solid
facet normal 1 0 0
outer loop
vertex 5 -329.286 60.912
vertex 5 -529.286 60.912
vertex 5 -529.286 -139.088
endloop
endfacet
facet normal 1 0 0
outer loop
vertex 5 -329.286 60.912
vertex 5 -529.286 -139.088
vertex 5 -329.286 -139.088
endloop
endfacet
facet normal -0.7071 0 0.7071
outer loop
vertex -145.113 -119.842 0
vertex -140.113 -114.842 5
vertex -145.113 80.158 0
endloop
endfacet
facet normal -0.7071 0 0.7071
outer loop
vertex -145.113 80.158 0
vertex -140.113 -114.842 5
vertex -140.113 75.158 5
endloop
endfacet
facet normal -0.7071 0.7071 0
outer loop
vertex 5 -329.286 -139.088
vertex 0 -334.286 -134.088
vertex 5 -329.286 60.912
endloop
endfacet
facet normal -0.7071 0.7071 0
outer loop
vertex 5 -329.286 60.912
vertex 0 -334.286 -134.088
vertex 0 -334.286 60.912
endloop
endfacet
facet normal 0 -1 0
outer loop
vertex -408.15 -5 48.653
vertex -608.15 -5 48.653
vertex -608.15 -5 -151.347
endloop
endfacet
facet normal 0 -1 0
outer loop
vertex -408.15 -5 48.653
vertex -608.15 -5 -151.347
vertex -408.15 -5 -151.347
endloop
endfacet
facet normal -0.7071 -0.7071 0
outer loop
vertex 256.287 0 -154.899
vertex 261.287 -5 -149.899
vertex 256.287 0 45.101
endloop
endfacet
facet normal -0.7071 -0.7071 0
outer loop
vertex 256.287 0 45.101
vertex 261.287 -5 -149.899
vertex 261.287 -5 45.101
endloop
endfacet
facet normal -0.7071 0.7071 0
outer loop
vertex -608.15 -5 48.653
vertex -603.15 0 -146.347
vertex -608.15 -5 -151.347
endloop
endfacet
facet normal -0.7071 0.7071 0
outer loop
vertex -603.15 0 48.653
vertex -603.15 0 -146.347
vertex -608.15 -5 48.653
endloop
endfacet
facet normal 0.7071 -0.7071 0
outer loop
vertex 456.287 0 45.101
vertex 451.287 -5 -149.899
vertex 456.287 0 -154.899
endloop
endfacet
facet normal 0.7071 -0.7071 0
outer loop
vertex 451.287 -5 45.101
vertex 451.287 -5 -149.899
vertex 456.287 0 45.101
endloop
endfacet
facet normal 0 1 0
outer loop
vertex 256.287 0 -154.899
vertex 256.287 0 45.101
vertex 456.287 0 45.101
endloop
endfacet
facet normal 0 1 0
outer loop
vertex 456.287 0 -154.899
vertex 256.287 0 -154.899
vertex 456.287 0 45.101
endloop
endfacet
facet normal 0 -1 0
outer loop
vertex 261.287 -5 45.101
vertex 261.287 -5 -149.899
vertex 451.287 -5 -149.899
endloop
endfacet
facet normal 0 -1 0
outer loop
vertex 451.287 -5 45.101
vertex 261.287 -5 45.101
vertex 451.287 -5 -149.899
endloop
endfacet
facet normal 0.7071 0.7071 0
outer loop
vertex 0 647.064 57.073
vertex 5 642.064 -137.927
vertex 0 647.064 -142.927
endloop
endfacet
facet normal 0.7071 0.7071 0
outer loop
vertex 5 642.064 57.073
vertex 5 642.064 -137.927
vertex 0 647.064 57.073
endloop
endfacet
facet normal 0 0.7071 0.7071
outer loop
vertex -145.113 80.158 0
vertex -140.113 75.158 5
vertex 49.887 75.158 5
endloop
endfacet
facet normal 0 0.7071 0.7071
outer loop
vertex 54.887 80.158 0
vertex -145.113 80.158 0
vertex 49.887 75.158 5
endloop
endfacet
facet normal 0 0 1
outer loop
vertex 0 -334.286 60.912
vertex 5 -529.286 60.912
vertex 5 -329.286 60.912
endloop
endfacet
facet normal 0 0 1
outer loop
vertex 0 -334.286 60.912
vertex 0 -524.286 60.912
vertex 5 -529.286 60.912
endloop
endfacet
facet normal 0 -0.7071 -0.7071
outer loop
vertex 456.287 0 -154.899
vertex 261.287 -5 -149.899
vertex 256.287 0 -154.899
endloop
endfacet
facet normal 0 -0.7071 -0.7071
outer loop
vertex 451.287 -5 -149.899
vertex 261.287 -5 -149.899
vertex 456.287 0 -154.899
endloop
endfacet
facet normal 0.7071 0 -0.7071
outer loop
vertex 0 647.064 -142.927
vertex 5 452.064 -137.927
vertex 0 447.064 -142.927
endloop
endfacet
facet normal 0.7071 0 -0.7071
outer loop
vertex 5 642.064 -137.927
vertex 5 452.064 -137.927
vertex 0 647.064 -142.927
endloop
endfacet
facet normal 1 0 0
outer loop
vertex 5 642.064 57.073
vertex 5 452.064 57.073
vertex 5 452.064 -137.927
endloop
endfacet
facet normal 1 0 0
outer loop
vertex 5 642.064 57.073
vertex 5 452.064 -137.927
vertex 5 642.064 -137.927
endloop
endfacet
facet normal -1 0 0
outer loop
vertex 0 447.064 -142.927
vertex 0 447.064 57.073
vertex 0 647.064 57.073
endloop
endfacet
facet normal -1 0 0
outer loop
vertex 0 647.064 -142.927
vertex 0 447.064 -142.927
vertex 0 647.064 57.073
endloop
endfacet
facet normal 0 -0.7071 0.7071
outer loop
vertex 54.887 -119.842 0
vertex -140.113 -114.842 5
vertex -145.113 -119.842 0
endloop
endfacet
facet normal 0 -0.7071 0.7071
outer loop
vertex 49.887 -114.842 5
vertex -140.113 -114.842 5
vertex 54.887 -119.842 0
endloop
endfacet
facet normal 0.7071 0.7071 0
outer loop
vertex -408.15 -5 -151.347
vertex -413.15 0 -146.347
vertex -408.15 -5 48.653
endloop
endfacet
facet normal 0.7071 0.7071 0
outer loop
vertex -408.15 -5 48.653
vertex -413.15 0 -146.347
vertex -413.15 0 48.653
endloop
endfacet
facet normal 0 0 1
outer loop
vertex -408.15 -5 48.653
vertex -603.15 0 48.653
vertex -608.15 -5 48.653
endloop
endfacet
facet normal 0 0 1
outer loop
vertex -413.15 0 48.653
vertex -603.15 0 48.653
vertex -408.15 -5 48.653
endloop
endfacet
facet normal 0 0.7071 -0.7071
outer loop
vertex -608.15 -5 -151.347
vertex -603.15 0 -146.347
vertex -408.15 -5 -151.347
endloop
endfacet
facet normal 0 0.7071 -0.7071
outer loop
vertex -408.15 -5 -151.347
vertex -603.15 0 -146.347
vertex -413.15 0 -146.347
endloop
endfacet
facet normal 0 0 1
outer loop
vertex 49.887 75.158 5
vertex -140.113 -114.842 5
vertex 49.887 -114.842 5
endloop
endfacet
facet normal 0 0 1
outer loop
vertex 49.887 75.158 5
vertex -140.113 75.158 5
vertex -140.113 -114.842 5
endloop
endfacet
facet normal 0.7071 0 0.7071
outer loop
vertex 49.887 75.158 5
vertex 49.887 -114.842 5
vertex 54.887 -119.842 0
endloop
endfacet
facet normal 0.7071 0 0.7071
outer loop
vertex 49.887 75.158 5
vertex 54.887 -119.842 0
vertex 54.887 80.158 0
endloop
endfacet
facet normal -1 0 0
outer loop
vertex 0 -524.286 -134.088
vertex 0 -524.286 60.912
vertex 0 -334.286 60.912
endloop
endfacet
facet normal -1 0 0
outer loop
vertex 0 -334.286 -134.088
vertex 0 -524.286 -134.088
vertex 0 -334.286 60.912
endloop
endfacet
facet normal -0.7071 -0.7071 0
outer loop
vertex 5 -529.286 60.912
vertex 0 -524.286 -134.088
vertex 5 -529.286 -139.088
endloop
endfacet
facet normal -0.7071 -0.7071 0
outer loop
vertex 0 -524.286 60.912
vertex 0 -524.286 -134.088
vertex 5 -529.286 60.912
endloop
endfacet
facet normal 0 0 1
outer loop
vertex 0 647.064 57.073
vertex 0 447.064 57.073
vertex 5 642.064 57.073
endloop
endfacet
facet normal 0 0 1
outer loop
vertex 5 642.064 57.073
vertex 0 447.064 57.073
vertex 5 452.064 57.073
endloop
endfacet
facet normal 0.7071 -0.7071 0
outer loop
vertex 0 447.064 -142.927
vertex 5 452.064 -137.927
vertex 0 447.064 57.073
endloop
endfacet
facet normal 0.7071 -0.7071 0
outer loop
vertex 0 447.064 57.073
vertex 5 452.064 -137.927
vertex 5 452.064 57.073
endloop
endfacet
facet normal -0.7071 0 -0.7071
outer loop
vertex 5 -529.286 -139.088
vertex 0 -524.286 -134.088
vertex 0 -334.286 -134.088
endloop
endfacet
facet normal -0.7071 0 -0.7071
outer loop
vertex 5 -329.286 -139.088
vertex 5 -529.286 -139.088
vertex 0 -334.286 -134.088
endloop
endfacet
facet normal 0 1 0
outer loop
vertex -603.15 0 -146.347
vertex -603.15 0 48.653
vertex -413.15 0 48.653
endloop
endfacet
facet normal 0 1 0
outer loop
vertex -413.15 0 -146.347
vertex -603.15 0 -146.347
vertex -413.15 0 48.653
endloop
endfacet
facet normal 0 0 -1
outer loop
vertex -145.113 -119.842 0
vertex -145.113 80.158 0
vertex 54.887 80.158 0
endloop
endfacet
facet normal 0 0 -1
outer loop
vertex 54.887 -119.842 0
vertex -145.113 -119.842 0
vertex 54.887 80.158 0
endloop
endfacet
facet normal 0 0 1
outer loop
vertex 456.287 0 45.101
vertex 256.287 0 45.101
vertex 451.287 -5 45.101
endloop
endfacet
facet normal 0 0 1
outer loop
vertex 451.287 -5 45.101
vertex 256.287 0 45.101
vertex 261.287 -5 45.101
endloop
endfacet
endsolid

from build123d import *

# Parameters (mm, degrees)
F0_W       = 200
F0_H       = 200
F1_DEPTH   = 5
F2_SIZE    = 4.99999
F3_W       = 200
F3_H       = 200
F4_DEPTH   = 5
F5_SIZE    = 4.99999
F6_W       = 200
F6_H       = 200
F7_DEPTH   = 5
F8_SIZE    = 4.99999
F9_W       = 200
F9_H       = 200
F10_DEPTH  = 5
F11_SIZE   = 4.99999
F11_2_SIZE = 4.99999


# Not quite as in the source:
# - a fillet or chamfer is up to 0.001 mm smaller than in the source, because OpenCascade refuses the exact size


with BuildPart() as f1:
    # F0 (on Top) → F1 (new body)
    with BuildSketch(Plane.XY):
        with Locations((-45.1127041131, -19.84155476)):
            Rectangle(F0_W, F0_H)
    extrude(amount=F1_DEPTH)

    # F2 (size 5 in the source; OpenCascade refuses exactly that, so slightly less here)
    f2_edges = [f1.edges().sort_by_distance(p)[0] for p in [
        (-45.112704, -119.841555, 5),
        (54.887296, -19.841555, 5),
        (-45.112704, 80.158445, 5),
        (-145.112704, -19.841555, 5),
    ]]
    chamfer(f2_edges, length=F2_SIZE)


with BuildPart() as f4:
    # F3 (on Front) → F4 (new body)
    with BuildSketch(Plane.XZ):
        with Locations((356.2874466181, -54.8991493524)):
            Rectangle(F3_W, F3_H)
    extrude(amount=F4_DEPTH)

    # F5 (size 5 in the source; OpenCascade refuses exactly that, so slightly less here)
    f5_edges = [f4.edges().sort_by_distance(p)[0] for p in [
        (356.287447, -5, -154.899149),
        (256.287447, -5, -54.899149),
        (456.287447, -5, -54.899149),
    ]]
    chamfer(f5_edges, length=F5_SIZE)


with BuildPart() as f7:
    # F6 (on Front) → F7 (new body)
    with BuildSketch(Plane.XZ):
        with Locations((-508.1502228975, -51.3473520487)):
            Rectangle(F6_W, F6_H)
    extrude(amount=F7_DEPTH)

    # F8 (size 5 in the source; OpenCascade refuses exactly that, so slightly less here)
    f8_edges = [f7.edges().sort_by_distance(p)[0] for p in [
        (-408.150223, 0, -51.347352),
        (-508.150223, 0, -151.347352),
        (-608.150223, 0, -51.347352),
    ]]
    chamfer(f8_edges, length=F8_SIZE)


with BuildPart() as f10:
    # F9 (on Right) → F10 (new body)
    with BuildSketch(Plane.YZ):
        with Locations((547.0643907785, -42.9269958158)):
            Rectangle(F9_W, F9_H)
    extrude(amount=F10_DEPTH)

    # F11 (size 5 in the source; OpenCascade refuses exactly that, so slightly less here)
    f11_edges = [f10.edges().sort_by_distance(p)[0] for p in [
        (5, 447.064391, -42.926996),
        (5, 547.064391, -142.926996),
        (5, 647.064391, -42.926996),
    ]]
    chamfer(f11_edges, length=F11_SIZE)


with BuildPart() as f10b:
    # F9 (on Right) → F10, piece 2 (new body)
    with BuildSketch(Plane.YZ):
        with Locations((-429.2863249779, -39.0882730484)):
            Rectangle(F9_W, F9_H)
    extrude(amount=F10_DEPTH)

    # F11#2 (size 5 in the source; OpenCascade refuses exactly that, so slightly less here)
    f11_2_edges = [f10b.edges().sort_by_distance(p)[0] for p in [
        (0, -329.286325, -39.088273),
        (0, -429.286325, -139.088273),
        (0, -529.286325, -39.088273),
    ]]
    chamfer(f11_2_edges, length=F11_2_SIZE)


solid = Compound([f1.part, f4.part, f7.part, f10.part, f10b.part])
